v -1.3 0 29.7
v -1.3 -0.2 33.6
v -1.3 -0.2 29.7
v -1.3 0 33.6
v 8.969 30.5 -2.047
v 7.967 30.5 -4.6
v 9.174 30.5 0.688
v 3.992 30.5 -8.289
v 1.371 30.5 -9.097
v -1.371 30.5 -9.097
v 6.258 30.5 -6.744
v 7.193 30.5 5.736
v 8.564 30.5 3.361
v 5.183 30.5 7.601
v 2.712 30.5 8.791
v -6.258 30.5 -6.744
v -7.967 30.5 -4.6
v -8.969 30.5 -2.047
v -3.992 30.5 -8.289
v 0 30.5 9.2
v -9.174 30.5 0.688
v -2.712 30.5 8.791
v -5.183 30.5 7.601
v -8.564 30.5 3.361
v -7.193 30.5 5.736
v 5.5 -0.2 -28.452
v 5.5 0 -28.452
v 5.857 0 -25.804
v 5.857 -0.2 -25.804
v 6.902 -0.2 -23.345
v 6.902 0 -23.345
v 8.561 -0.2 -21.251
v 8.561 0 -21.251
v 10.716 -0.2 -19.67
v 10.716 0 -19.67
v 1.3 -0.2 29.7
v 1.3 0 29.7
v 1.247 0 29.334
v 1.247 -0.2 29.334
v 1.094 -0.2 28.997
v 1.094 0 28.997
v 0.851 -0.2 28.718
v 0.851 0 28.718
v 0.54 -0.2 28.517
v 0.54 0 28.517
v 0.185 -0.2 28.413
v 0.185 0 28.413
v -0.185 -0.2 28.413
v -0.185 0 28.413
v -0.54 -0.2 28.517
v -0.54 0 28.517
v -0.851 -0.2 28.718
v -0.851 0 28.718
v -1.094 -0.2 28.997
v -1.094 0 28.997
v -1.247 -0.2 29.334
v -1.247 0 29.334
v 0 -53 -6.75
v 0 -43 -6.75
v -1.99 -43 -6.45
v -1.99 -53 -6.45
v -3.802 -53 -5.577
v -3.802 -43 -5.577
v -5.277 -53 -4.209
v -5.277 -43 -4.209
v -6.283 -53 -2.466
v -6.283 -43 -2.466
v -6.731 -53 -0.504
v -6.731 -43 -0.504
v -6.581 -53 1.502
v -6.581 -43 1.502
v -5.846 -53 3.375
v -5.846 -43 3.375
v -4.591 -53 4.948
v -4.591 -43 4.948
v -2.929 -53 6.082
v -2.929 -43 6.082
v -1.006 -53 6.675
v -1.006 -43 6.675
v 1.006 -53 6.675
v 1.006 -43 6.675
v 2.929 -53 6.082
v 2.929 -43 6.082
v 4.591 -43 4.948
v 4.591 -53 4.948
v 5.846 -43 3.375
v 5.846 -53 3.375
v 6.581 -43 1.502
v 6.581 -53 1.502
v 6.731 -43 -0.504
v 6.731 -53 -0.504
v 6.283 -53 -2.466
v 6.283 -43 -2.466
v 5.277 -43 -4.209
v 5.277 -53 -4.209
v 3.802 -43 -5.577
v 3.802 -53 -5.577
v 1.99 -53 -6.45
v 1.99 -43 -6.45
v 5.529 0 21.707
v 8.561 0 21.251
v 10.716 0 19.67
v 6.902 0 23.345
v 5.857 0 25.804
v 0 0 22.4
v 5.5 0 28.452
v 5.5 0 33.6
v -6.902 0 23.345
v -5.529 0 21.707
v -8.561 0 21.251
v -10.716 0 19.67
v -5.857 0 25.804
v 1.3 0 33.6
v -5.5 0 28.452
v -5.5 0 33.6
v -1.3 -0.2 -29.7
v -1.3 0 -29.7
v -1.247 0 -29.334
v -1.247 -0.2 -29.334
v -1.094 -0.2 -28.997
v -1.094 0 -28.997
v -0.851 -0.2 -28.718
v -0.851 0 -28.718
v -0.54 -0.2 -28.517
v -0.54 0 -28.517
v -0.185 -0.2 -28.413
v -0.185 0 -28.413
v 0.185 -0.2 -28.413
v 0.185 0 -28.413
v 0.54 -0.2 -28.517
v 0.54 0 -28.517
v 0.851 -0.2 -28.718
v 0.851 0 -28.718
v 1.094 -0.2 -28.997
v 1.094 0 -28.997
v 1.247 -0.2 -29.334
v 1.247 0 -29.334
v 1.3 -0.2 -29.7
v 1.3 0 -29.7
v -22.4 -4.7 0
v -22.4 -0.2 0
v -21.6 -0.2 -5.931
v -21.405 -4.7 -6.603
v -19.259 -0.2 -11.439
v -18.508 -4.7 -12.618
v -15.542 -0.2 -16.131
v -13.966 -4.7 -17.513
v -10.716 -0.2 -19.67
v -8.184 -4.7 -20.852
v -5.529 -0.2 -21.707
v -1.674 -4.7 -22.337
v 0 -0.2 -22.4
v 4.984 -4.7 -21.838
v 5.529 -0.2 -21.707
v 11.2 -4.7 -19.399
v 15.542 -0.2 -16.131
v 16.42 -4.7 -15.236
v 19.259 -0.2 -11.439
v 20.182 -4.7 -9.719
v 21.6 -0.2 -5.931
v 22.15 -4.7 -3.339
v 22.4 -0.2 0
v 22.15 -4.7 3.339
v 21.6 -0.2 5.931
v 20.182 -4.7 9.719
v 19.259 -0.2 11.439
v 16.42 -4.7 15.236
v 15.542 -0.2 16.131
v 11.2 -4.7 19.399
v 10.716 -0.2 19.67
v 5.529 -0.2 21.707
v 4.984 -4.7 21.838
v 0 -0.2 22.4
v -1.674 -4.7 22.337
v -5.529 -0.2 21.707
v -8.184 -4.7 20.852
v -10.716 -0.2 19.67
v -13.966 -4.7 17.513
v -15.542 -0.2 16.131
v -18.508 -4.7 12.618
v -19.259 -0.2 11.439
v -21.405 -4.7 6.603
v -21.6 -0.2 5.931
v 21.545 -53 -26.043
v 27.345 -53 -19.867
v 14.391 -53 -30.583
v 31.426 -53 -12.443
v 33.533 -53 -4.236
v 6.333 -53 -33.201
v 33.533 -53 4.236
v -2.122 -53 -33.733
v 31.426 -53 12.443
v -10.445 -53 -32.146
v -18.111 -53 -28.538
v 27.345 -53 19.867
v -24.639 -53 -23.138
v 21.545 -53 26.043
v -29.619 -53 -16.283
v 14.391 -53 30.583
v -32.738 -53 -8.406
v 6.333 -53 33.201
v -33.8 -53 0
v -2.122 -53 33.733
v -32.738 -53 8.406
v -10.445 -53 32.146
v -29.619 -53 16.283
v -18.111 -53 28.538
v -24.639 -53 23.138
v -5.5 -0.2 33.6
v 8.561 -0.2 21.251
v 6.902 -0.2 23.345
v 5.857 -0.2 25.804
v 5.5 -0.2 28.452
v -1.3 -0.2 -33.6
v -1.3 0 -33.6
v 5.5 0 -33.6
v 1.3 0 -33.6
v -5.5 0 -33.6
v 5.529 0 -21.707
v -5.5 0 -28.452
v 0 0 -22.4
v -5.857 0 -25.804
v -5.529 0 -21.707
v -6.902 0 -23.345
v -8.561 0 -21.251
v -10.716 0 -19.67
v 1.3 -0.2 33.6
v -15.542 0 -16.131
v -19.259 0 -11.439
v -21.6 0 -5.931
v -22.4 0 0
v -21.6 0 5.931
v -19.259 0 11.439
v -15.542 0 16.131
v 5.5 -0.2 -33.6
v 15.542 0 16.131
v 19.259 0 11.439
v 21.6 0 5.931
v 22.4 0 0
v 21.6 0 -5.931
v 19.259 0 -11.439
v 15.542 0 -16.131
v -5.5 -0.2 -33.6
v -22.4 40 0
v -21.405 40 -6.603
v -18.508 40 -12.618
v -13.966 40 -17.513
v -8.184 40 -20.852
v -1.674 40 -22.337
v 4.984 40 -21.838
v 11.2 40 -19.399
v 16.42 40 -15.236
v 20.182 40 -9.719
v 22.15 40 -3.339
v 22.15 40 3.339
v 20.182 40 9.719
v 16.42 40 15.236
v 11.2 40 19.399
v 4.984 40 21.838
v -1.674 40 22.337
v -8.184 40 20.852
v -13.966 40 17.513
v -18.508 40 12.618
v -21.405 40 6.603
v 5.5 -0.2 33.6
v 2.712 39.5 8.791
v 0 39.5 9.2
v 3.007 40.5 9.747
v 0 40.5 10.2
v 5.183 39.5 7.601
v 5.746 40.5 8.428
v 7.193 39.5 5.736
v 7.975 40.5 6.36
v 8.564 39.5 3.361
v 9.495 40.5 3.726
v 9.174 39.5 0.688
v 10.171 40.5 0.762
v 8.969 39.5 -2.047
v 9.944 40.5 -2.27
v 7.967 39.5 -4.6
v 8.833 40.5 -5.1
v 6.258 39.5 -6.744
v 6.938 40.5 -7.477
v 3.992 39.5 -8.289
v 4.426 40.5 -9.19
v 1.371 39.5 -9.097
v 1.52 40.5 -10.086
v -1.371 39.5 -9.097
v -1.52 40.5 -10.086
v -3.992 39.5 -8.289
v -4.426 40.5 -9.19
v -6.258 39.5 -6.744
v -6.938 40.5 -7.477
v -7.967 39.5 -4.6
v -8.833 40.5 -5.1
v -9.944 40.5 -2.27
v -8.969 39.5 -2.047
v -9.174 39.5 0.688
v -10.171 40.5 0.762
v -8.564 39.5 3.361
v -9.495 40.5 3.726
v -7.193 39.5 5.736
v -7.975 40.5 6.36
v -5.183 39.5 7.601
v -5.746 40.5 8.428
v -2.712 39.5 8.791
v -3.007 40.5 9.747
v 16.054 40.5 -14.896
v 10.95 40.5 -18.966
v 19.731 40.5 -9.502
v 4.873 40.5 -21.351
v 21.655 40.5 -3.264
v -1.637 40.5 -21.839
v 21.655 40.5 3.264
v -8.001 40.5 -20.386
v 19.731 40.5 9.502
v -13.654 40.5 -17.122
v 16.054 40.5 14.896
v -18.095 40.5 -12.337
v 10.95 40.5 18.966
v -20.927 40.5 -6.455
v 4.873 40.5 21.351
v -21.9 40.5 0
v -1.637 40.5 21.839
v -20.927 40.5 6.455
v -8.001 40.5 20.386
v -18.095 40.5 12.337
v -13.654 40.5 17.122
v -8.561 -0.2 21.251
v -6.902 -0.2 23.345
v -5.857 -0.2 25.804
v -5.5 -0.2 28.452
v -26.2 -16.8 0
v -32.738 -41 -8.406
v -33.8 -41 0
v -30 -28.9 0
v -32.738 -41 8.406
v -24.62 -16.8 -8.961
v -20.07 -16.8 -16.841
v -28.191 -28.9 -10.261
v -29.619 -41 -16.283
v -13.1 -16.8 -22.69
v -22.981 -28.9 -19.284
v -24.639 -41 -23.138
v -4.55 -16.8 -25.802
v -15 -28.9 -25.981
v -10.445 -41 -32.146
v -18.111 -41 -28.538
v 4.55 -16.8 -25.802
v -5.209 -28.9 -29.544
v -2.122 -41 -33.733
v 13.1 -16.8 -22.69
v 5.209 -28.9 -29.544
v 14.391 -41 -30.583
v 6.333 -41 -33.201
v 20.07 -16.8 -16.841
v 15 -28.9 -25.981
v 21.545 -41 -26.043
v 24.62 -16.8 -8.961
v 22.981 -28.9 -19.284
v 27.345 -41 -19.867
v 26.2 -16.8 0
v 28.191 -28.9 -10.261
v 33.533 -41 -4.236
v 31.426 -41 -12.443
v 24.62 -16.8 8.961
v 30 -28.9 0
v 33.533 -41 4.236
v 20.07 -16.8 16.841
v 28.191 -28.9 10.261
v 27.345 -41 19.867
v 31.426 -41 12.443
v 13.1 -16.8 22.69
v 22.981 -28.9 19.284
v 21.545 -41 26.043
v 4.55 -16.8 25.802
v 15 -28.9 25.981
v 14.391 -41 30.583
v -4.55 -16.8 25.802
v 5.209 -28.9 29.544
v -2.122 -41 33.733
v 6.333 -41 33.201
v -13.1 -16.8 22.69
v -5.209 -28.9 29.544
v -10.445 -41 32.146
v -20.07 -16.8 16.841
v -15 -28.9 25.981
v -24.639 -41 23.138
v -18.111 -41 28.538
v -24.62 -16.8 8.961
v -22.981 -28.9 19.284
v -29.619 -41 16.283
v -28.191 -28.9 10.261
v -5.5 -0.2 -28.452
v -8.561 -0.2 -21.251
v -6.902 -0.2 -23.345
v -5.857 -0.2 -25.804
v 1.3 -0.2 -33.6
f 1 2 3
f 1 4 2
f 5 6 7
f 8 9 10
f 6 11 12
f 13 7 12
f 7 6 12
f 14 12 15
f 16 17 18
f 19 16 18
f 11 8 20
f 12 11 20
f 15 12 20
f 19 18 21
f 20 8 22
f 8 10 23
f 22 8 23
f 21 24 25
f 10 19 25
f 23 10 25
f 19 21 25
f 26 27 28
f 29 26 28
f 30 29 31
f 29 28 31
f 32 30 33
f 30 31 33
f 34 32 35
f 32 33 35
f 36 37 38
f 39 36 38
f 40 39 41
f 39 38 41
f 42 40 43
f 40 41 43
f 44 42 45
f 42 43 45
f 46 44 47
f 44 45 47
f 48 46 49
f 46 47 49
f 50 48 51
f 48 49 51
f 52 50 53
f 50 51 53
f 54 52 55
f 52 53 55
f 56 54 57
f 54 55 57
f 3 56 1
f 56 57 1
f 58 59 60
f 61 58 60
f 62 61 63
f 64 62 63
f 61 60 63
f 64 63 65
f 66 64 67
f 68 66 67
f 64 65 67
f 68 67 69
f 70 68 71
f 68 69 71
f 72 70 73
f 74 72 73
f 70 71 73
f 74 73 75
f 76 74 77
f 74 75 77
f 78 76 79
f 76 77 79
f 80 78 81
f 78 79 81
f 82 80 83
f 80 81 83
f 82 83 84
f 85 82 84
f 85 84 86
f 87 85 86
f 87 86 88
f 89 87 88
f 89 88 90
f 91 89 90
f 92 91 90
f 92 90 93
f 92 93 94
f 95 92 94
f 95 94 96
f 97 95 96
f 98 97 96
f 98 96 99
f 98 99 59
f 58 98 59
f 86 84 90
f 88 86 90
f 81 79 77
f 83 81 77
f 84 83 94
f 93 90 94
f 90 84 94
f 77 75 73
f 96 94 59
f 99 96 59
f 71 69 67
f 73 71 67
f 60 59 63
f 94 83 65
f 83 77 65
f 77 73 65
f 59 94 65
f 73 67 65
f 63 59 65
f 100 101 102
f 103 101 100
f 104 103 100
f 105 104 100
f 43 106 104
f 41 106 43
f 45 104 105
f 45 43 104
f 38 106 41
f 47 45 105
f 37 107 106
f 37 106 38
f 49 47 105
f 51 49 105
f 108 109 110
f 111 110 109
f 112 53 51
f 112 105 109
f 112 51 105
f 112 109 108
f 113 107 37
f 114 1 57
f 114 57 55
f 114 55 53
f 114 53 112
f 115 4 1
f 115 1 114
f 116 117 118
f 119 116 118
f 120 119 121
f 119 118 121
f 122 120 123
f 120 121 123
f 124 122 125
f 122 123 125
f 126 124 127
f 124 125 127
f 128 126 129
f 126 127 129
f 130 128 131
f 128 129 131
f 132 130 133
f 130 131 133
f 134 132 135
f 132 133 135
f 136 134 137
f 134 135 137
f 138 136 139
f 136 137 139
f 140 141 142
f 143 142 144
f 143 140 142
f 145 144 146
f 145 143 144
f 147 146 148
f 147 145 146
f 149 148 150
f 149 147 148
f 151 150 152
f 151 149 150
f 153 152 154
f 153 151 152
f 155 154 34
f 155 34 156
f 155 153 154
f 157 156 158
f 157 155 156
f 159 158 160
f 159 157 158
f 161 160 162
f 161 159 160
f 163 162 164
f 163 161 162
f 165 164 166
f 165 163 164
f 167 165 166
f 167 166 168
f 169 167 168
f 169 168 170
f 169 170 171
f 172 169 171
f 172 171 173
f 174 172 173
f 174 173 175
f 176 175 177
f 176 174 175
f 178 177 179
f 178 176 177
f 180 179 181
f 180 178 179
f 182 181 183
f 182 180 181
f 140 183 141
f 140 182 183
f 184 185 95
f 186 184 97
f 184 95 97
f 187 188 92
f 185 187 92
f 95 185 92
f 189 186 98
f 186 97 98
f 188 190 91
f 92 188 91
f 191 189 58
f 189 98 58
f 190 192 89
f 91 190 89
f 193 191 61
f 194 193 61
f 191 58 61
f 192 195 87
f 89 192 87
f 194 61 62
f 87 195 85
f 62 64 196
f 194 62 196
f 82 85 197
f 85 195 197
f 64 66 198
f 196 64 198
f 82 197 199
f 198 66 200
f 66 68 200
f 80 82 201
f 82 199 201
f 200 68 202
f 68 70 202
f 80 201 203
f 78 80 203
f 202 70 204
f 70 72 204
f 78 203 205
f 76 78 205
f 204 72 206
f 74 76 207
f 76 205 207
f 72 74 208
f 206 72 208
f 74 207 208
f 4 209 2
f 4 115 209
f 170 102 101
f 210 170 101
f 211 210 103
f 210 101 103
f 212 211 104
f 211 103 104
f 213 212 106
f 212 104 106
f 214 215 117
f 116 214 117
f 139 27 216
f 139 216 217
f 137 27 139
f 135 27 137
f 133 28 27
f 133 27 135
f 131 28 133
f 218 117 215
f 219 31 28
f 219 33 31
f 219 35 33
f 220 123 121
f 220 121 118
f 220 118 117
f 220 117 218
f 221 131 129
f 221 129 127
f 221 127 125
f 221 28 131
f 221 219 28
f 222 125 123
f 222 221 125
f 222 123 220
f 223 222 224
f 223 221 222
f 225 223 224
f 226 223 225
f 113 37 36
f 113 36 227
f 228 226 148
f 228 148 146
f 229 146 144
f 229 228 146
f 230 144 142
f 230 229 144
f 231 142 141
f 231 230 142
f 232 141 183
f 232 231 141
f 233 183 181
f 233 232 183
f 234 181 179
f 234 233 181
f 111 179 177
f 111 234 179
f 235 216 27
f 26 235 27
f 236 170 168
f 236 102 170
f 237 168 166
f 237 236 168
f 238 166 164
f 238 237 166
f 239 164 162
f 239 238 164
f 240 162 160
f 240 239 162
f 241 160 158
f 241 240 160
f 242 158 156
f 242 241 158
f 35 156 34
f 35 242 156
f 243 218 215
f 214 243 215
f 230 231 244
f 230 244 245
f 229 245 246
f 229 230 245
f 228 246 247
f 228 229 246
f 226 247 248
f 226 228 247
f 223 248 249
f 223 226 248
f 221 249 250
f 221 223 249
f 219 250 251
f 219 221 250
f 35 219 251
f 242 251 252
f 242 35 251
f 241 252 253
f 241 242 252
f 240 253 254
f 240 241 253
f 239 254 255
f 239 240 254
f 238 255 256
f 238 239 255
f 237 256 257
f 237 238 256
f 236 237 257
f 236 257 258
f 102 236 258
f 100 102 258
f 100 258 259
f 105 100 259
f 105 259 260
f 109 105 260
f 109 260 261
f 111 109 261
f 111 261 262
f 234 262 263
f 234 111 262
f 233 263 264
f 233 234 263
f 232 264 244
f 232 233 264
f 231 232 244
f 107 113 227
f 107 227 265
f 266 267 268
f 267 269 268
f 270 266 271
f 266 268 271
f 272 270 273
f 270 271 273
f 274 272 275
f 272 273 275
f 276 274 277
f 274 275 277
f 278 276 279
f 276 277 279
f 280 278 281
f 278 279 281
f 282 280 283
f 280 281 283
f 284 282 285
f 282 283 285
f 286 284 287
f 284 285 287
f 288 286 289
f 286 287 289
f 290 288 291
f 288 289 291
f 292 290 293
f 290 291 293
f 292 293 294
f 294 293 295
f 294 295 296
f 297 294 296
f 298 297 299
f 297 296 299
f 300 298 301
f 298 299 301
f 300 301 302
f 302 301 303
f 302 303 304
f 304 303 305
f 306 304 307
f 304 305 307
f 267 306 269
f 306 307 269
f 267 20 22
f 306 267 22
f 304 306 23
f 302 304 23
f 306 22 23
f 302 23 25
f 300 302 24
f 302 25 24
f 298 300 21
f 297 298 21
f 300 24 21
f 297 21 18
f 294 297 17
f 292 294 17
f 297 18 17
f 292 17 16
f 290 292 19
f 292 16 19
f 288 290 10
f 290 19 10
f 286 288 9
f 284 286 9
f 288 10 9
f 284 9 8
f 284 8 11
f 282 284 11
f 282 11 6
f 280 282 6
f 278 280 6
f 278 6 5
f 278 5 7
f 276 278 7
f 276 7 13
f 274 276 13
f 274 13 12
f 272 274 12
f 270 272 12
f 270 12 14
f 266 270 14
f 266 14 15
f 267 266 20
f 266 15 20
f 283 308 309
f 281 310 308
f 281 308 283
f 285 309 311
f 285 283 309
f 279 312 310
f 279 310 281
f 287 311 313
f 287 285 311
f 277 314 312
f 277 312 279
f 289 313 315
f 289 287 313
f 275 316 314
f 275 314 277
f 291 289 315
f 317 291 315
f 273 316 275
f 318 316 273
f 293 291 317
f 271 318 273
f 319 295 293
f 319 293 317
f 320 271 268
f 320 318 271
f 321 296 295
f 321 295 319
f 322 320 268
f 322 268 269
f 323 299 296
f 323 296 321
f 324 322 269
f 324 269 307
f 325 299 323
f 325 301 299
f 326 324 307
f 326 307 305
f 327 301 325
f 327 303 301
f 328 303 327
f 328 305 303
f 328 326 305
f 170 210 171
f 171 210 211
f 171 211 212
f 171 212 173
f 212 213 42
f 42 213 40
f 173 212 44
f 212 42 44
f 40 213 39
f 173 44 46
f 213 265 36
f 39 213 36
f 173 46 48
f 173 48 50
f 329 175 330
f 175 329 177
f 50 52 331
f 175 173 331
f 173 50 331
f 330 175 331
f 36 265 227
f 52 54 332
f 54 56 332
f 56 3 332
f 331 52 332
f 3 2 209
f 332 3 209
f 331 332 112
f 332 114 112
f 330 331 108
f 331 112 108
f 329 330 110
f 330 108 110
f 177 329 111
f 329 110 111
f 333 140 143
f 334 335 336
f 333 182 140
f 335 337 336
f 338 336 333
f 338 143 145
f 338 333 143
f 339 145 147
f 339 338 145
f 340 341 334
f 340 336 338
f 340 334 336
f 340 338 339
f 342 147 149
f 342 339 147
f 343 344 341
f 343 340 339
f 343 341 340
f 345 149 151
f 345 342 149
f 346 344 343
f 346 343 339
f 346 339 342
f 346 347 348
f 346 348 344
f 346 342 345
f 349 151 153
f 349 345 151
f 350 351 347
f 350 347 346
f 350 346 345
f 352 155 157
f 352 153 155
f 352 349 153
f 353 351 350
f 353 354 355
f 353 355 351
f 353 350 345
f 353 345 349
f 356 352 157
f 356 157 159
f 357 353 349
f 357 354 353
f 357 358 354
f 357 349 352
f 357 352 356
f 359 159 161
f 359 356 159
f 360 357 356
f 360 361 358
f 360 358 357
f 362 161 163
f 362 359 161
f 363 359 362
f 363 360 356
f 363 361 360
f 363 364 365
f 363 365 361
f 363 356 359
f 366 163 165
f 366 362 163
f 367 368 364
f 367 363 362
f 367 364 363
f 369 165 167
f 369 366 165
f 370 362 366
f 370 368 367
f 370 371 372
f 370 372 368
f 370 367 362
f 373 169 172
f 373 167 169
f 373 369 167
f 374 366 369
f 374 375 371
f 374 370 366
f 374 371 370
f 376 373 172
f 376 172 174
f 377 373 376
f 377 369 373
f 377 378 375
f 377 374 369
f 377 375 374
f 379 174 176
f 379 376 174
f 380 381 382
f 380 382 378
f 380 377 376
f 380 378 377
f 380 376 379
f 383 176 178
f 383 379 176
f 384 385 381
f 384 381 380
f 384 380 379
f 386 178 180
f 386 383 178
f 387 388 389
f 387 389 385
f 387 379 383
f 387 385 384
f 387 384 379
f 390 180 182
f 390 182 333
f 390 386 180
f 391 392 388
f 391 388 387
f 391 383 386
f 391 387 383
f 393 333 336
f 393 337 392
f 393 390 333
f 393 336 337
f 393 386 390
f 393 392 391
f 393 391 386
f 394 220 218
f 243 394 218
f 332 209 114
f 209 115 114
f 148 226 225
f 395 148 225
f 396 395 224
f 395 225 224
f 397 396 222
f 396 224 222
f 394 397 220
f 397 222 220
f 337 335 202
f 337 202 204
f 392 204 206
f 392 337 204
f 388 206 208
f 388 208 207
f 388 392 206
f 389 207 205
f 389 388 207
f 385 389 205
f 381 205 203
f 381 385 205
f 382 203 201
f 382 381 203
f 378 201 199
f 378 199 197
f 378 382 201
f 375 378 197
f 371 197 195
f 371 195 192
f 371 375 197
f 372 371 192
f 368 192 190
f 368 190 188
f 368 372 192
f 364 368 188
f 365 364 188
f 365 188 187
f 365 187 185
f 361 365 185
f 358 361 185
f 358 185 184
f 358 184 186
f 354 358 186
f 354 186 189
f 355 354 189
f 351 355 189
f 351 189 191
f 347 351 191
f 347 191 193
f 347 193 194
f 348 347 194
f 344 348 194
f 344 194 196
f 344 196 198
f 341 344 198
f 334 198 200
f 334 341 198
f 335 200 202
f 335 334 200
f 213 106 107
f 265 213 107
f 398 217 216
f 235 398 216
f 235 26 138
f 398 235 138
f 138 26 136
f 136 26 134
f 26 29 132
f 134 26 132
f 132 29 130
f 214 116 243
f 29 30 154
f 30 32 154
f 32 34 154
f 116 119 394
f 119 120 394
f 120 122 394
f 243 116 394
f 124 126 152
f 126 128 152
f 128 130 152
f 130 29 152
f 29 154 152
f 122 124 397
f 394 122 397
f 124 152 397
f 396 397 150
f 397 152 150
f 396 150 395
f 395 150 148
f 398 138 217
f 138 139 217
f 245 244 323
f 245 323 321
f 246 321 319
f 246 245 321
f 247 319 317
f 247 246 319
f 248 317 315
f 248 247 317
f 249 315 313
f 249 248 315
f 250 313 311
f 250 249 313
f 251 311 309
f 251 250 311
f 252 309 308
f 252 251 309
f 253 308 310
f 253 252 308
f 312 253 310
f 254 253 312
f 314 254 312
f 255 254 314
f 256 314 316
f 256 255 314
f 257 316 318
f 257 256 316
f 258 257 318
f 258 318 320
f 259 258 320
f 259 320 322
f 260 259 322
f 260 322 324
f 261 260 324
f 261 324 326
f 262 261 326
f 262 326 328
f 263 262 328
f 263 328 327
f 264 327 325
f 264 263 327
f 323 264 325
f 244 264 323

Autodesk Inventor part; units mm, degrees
sketch "Sketch1" plane through (0, 0, 0) normal (0, 1, 0) x (-1, 0, 0)
  circle A0 centre (0, 0) radius 22.4
  dimension "d0" = 44.8
ref_plane "Work Plane1" through (0, 40.5, 0) normal (0, 1, 0) x (-1, 0, 0)
sketch "Sketch2" plane through (0, 40.5, 0) normal (0, 1, 0) x (-1, 0, 0)
  circle A0 centre (0, 0) radius 22.4 projected
ref_plane "Work Plane3" through (0, -53, 0) normal (0, 1, 0) x (-1, 0, 0)
ref_plane "Work Plane2" through (0, -41, 0) normal (0, 1, 0) x (-1, 0, 0)
sketch "Sketch3" plane through (0, -41, 0) normal (0, 1, 0) x (-1, 0, 0)
  circle A0 centre (0, 0) radius 33.8
  dimension "d4" = 67.6
sketch "Sketch4" plane through (0, -53, 0) normal (0, 1, 0) x (-1, 0, 0)
  circle A0 centre (0, 0) radius 33.8 projected
loft "Loft1" add profiles "Sketch2", "Sketch1"
loft "Loft3" [suppressed]
sketch "Sketch5" plane through (0, 0, 0) normal (0, 1, 0) x (-1, 0, 0)
  line L0 (-5.5, 33.6) -> (5.5, -33.6) construction
  line L1 (3.6185, 22.1058) -> (-5.5, -33.6) construction
  line L2 (5.5, 33.6) -> (5.5, 28.4519)
  line L3 (5.5, -28.4519) -> (5.5, -33.6)
  line L4 (-5.5, -33.6) -> (-5.5, -28.4519)
  line L5 (-5.5, 28.4519) -> (-5.5, 33.6)
  arc A0 (-10.716, 19.6704) -> (-10.716, -19.6704) centre (0, 0) ccw
  arc A1 (10.716, -19.6704) -> (10.716, 19.6704) centre (0, 0) ccw
  arc A2 (5.5, 28.4519) -> (10.716, 19.6704) centre (15.5, 28.4519) ccw
  arc A3 (-10.716, 19.6704) -> (-5.5, 28.4519) centre (-15.5, 28.4519) ccw
  arc A4 (10.716, -19.6704) -> (5.5, -28.4519) centre (15.5, -28.4519) ccw
  arc A5 (-5.5, -28.4519) -> (-10.716, -19.6704) centre (-15.5, -28.4519) ccw
  circle A6 centre (0, 0) radius 22.4 construction
  line L6 (0, -22.4) -> (0, -33.6) construction
  line L7 (1.3, -33.6) -> (1.3, -29.7)
  line L8 (0, -28.4) -> (0, -28.4)
  line L9 (-1.3, -29.7) -> (-1.3, -33.6)
  arc A7 (1.3, -29.7) -> (0, -28.4) centre (0, -29.7) ccw
  arc A8 (0, -28.4) -> (-1.3, -29.7) centre (0, -29.7) ccw
  line L10 (5.5, -33.6) -> (1.3, -33.6)
  line L11 (-1.3, -33.6) -> (-5.5, -33.6)
  circle A9 centre (0, 0) radius 33.8 construction
  line L12 (33.8, 0) -> (-33.8, 0) construction
  line L13 (0, 22.4) -> (0, 33.6) construction
  line L14 (1.3, 33.6) -> (1.3, 29.7)
  line L15 (-1.3, 29.7) -> (-1.3, 33.6)
  arc A10 (0, 28.4) -> (1.3, 29.7) centre (0, 29.7) ccw
  arc A11 (-1.3, 29.7) -> (0, 28.4) centre (0, 29.7) ccw
  line L16 (5.5, 33.6) -> (1.3, 33.6)
  line L17 (-1.3, 33.6) -> (-5.5, 33.6)
  circle A12 centre (0, 0) radius 33.8 construction
  point P0 (5.5, 21.7143)
  point P1 (5.5, -21.7143)
  point P2 (-5.5, 21.7143)
  point P3 (-5.5, -21.7143)
  point P4 (1.3, -28.4)
  point P5 (-1.3, -28.4)
  point P6 (1.3, 28.4)
  point P7 (-1.3, 28.4)
  point P8 (0, 28.4)
  dimension "d17" = 11
  dimension "d18" = 67.2
  dimension "d19" = 10
  dimension "d20" = 2.6
  dimension "d21" = 5.2
  dimension "d22" = 1.3
extrude "Extrusion1" add sketch "Sketch5" against normal blind 0.2
ref_plane "Work Plane4" through (0, -4.7, 0) normal (0, 1, 0) x (-1, 0, 0)
sketch "Sketch6" plane through (0, -4.7, 0) normal (0, 1, 0) x (-1, 0, 0)
  circle A0 centre (0, 0) radius 22.4 projected
ref_plane "Work Plane5" through (0, -53, 0) normal (0, 1, 0) x (-1, 0, 0)
sketch "Sketch7" plane through (0, -53, 0) normal (0, 1, 0) x (-1, 0, 0)
  circle A0 centre (0, 0) radius 33.8 projected
loft "Loft4" add profiles "Sketch7", "Sketch3"
loft "Loft5" add profiles "Sketch6" section 1 edges at (33.8, -41, 0)
sketch "Sketch8" plane through (0, 0, 0) normal (0, 1, 0) x (-1, 0, 0)
  circle A0 centre (0, 0) radius 22.4 projected
loft "Loft6" add profiles "Sketch8" section 2 edges at (22.4, -4.7, 0)
sketch "Sketch9" plane through (0, 40.5, 0) normal (0, 1, 0) x (1, 0, 0)
  point P0 (0, 0)
  point P1 (0, 0)
hole "Hole1" at (0, 40.5, 0) direction (0, -1, 0) diameter 18.4 depth 10
chamfer "Chamfer1" distance 1 angle 45 1 edges at (0, 40.5, -9.2)
chamfer "Chamfer2" distance 0.5 angle 45 1 edges at (22.4, 40.5, 0)
sketch "Sketch10" plane through (0, -53, 0) normal (0, -1, 0) x (1, 0, 0)
  point P0 (0, 0)
  point P1 (0, 0)
hole "Hole2" at (0, -53, 0) direction (0, 1, 0) diameter 13.5 depth 10
properties part number "shaker"
